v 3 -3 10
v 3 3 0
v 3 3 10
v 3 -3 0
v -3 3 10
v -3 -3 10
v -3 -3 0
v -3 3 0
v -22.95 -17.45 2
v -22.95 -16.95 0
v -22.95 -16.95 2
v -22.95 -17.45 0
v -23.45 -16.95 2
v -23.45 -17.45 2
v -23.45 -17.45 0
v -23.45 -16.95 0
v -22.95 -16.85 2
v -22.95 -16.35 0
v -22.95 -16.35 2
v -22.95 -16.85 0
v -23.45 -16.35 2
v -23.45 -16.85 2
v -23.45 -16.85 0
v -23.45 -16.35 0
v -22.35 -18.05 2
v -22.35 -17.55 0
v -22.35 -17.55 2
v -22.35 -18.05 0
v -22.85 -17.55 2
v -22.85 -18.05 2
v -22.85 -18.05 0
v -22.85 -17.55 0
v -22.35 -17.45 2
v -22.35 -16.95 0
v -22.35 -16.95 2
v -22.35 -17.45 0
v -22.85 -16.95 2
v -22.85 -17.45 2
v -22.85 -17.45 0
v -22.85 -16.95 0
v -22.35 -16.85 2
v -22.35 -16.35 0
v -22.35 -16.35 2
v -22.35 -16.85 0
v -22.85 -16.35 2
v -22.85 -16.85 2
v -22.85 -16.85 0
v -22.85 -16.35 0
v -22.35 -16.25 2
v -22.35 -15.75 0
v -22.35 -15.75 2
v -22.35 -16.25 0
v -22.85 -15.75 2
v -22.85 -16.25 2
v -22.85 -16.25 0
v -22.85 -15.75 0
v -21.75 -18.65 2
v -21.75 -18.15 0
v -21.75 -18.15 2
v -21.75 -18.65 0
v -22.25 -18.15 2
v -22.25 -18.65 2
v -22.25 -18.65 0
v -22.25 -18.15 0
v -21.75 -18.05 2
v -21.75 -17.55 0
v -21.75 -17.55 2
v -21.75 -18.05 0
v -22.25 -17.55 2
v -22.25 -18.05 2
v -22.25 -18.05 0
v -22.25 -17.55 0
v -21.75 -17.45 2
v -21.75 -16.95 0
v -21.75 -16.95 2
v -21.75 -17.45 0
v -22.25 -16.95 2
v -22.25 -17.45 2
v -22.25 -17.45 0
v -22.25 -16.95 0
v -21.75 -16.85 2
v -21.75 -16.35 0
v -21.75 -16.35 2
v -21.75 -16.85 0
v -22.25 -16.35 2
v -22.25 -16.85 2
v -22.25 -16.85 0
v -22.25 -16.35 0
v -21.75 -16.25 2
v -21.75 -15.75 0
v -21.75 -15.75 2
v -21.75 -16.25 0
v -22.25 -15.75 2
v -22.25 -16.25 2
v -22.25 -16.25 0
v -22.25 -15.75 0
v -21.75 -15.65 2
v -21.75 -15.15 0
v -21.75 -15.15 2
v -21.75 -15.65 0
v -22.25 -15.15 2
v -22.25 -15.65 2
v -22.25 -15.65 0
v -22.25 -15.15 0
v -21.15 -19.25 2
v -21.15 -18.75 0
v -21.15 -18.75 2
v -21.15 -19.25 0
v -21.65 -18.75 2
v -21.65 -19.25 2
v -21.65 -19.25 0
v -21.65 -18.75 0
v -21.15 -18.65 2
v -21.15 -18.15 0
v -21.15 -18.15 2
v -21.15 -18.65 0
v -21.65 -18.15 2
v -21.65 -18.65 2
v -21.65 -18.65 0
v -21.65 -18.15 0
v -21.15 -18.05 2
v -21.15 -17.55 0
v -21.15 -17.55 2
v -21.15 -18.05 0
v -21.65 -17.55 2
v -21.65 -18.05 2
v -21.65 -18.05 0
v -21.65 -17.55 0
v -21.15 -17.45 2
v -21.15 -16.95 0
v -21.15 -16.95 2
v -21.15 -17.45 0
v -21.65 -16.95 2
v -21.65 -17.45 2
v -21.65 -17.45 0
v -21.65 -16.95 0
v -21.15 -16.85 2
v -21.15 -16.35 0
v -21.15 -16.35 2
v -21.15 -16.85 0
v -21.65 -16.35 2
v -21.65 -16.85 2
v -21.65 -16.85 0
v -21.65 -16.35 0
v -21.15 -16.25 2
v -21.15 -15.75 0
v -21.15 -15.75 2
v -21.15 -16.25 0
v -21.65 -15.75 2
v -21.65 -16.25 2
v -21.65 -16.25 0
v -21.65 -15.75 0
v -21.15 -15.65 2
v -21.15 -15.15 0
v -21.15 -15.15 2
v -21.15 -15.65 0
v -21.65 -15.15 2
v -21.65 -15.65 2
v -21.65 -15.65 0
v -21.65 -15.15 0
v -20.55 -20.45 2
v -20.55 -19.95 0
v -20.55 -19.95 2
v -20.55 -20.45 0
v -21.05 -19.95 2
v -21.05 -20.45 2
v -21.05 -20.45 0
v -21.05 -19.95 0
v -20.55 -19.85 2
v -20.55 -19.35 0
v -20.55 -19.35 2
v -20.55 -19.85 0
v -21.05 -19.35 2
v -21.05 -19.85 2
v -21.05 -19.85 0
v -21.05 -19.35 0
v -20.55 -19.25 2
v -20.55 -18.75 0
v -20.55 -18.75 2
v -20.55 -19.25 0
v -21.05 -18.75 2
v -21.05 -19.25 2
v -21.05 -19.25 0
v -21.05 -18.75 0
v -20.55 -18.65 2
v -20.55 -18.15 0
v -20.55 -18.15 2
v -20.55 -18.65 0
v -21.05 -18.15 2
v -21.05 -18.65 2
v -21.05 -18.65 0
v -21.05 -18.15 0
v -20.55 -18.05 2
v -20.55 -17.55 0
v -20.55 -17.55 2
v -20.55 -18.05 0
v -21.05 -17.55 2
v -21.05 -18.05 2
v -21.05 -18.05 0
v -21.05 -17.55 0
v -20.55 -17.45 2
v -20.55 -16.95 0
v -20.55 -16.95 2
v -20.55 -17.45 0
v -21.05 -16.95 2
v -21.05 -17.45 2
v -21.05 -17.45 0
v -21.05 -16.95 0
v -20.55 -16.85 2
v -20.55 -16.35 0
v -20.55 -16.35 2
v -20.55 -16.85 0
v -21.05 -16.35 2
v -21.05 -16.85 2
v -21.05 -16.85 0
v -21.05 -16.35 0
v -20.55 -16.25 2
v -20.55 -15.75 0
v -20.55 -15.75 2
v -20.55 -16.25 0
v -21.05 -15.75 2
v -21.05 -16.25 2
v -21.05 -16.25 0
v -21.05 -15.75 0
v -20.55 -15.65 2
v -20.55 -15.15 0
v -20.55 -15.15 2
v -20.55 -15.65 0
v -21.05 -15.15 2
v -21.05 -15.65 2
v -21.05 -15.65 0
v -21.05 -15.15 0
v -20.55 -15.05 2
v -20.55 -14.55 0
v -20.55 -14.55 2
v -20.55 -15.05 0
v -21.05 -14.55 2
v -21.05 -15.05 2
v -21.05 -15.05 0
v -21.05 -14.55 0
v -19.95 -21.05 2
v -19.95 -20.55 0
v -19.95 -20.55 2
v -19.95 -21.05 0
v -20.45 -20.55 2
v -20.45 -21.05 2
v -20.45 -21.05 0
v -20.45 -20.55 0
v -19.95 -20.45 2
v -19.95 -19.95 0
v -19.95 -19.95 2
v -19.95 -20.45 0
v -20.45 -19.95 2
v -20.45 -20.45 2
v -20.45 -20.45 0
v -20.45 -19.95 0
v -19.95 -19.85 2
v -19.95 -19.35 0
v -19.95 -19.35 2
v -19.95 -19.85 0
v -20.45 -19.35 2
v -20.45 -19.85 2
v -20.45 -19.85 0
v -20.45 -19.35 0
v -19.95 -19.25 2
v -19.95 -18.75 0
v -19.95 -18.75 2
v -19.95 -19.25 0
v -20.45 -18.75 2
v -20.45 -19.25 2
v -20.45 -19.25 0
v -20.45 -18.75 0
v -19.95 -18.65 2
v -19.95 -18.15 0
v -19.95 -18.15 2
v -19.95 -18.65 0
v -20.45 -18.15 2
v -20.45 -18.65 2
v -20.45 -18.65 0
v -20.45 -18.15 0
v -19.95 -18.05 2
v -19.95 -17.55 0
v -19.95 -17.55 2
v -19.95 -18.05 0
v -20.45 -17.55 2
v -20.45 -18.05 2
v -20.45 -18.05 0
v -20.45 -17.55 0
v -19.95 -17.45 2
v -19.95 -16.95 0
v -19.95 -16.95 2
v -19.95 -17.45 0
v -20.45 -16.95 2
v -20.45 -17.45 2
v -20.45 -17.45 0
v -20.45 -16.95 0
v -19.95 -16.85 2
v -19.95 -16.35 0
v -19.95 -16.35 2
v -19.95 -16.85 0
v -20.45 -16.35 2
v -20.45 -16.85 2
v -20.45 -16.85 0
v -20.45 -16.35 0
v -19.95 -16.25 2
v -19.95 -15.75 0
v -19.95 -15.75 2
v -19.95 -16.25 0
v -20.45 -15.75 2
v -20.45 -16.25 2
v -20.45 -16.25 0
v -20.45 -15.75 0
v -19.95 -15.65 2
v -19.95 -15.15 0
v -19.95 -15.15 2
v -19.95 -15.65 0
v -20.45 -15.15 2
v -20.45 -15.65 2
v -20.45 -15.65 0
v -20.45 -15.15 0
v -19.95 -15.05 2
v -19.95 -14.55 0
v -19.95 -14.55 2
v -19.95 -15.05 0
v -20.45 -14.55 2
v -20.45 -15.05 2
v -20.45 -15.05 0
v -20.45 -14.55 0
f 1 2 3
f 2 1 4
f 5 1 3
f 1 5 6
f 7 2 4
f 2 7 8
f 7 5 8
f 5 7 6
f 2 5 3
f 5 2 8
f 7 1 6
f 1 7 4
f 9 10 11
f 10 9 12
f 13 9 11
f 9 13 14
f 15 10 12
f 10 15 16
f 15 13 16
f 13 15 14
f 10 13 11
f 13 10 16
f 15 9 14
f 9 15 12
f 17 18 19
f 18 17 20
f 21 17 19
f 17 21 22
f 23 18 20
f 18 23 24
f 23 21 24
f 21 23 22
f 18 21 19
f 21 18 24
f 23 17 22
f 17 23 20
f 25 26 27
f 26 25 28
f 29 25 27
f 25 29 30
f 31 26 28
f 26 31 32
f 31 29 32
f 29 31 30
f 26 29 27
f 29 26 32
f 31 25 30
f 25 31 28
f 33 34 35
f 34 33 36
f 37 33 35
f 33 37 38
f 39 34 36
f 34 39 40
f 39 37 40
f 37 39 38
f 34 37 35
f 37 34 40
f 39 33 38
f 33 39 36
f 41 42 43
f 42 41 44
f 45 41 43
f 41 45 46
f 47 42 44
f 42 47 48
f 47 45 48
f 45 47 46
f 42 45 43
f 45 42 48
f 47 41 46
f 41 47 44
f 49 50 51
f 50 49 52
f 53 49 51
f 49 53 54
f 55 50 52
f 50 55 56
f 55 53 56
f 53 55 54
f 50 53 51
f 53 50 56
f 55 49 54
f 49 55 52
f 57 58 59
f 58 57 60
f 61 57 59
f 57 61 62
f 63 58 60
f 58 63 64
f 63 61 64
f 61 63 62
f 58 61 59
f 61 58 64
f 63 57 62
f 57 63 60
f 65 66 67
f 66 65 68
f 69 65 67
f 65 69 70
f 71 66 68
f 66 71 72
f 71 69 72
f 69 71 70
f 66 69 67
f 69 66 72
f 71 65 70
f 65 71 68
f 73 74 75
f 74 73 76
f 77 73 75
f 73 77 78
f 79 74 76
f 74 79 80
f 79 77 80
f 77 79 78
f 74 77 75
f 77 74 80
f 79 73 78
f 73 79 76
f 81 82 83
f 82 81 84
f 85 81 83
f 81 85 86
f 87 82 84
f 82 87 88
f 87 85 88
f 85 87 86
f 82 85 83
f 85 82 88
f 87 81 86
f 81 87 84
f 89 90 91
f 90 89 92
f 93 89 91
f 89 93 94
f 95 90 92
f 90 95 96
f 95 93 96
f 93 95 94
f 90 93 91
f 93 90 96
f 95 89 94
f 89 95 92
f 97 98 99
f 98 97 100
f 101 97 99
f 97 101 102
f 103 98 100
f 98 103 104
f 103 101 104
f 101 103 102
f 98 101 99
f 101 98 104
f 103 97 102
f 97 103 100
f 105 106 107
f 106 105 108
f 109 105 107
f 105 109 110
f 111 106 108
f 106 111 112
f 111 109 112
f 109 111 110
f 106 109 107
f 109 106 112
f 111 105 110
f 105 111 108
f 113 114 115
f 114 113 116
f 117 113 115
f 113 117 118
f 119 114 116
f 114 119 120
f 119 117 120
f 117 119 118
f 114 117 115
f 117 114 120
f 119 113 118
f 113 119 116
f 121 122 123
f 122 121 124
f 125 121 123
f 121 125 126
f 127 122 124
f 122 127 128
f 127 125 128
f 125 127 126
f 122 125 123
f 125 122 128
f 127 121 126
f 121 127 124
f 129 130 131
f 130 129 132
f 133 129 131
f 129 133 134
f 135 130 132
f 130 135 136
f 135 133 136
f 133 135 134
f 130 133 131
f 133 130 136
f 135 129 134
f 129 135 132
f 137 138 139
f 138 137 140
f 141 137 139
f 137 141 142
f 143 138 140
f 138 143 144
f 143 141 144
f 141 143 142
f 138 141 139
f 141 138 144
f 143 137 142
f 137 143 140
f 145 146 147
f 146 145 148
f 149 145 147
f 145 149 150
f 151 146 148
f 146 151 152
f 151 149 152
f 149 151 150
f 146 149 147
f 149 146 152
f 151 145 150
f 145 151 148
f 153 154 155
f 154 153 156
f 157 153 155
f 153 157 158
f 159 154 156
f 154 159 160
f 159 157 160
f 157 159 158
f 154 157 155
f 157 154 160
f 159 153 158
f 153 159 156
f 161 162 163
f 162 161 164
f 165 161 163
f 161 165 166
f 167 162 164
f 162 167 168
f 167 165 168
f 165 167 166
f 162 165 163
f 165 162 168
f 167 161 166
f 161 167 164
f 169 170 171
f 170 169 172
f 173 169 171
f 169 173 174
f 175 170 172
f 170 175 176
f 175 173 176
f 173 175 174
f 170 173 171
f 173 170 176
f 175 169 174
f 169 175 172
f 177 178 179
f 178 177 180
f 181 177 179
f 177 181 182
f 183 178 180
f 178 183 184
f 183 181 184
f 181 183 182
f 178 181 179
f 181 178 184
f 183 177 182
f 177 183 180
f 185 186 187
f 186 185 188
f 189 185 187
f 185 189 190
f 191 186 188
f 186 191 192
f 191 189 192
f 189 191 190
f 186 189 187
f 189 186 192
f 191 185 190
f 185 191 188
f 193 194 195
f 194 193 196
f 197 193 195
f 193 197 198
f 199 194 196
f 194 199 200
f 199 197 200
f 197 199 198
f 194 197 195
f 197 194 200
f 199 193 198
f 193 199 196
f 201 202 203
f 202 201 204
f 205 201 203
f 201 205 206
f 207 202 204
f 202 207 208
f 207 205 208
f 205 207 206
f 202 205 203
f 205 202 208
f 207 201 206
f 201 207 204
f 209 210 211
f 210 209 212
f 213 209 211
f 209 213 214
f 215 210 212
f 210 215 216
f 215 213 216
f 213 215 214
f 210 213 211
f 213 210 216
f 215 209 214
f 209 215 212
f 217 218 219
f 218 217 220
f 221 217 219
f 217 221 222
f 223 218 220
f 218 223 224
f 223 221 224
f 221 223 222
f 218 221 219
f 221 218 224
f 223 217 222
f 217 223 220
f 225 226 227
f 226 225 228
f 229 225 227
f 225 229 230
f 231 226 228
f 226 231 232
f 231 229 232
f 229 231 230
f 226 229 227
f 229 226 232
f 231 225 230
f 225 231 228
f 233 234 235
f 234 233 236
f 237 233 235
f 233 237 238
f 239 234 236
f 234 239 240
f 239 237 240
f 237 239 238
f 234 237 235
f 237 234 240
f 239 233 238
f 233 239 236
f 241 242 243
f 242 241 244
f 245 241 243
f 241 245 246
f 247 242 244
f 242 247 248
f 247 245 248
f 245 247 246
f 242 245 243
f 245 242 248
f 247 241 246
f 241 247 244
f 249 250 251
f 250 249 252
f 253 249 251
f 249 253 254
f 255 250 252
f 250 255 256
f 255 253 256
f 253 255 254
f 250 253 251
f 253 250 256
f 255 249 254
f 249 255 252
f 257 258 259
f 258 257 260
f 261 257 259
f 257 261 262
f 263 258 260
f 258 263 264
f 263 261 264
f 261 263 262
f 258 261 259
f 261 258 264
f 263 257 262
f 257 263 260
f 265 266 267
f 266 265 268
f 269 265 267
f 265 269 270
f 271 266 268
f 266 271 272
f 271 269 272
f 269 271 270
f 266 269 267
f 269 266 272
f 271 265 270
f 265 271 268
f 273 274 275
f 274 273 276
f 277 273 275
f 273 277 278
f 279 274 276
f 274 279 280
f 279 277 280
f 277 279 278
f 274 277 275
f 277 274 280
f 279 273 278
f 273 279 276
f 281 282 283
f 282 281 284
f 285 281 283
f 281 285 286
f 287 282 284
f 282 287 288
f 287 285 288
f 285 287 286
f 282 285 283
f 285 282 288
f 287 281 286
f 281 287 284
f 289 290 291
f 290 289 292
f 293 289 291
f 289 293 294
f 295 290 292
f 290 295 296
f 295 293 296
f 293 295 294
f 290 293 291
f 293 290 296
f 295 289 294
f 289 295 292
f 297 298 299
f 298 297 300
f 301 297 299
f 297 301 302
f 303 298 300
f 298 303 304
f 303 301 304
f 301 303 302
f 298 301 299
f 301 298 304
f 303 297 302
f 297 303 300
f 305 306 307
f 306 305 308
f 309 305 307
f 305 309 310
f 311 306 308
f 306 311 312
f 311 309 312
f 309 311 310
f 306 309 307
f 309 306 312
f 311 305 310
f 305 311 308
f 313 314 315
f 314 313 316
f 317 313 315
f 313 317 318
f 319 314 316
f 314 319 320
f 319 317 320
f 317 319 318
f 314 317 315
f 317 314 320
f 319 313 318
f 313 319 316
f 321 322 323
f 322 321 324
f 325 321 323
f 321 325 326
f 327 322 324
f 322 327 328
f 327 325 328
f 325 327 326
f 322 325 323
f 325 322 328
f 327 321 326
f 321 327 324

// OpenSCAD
translate([0, 0, 5]) color([0,1,0,0.9]) cube([6, 6, 10], center=true);
translate([-23.2, -17.2, 1]) color([1,0,0]) cube([0.5, 0.5, 2], center=true);
translate([-23.2, -16.6, 1]) color([1,0,0]) cube([0.5, 0.5, 2], center=true);
translate([-22.6, -17.8, 1]) color([1,0,0]) cube([0.5, 0.5, 2], center=true);
translate([-22.6, -17.2, 1]) color([1,0,0]) cube([0.5, 0.5, 2], center=true);
translate([-22.6, -16.6, 1]) color([1,0,0]) cube([0.5, 0.5, 2], center=true);
translate([-22.6, -16.0, 1]) color([1,0,0]) cube([0.5, 0.5, 2], center=true);
translate([-22.0, -18.4, 1]) color([1,0,0]) cube([0.5, 0.5, 2], center=true);
translate([-22.0, -17.8, 1]) color([1,0,0]) cube([0.5, 0.5, 2], center=true);
translate([-22.0, -17.2, 1]) color([1,0,0]) cube([0.5, 0.5, 2], center=true);
translate([-22.0, -16.6, 1]) color([1,0,0]) cube([0.5, 0.5, 2], center=true);
translate([-22.0, -16.0, 1]) color([1,0,0]) cube([0.5, 0.5, 2], center=true);
translate([-22.0, -15.4, 1]) color([1,0,0]) cube([0.5, 0.5, 2], center=true);
translate([-21.4, -19.0, 1]) color([1,0,0]) cube([0.5, 0.5, 2], center=true);
translate([-21.4, -18.4, 1]) color([1,0,0]) cube([0.5, 0.5, 2], center=true);
translate([-21.4, -17.8, 1]) color([1,0,0]) cube([0.5, 0.5, 2], center=true);
translate([-21.4, -17.2, 1]) color([1,0,0]) cube([0.5, 0.5, 2], center=true);
translate([-21.4, -16.6, 1]) color([1,0,0]) cube([0.5, 0.5, 2], center=true);
translate([-21.4, -16.0, 1]) color([1,0,0]) cube([0.5, 0.5, 2], center=true);
translate([-21.4, -15.4, 1]) color([1,0,0]) cube([0.5, 0.5, 2], center=true);
translate([-20.8, -20.2, 1]) color([1,0,0]) cube([0.5, 0.5, 2], center=true);
translate([-20.8, -19.6, 1]) color([1,0,0]) cube([0.5, 0.5, 2], center=true);
translate([-20.8, -19.0, 1]) color([1,0,0]) cube([0.5, 0.5, 2], center=true);
translate([-20.8, -18.4, 1]) color([1,0,0]) cube([0.5, 0.5, 2], center=true);
translate([-20.8, -17.8, 1]) color([1,0,0]) cube([0.5, 0.5, 2], center=true);
translate([-20.8, -17.2, 1]) color([1,0,0]) cube([0.5, 0.5, 2], center=true);
translate([-20.8, -16.6, 1]) color([1,0,0]) cube([0.5, 0.5, 2], center=true);
translate([-20.8, -16.0, 1]) color([1,0,0]) cube([0.5, 0.5, 2], center=true);
translate([-20.8, -15.4, 1]) color([1,0,0]) cube([0.5, 0.5, 2], center=true);
translate([-20.8, -14.8, 1]) color([1,0,0]) cube([0.5, 0.5, 2], center=true);
translate([-20.2, -20.8, 1]) color([1,0,0]) cube([0.5, 0.5, 2], center=true);
translate([-20.2, -20.2, 1]) color([1,0,0]) cube([0.5, 0.5, 2], center=true);
translate([-20.2, -19.6, 1]) color([1,0,0]) cube([0.5, 0.5, 2], center=true);
translate([-20.2, -19.0, 1]) color([1,0,0]) cube([0.5, 0.5, 2], center=true);
translate([-20.2, -18.4, 1]) color([1,0,0]) cube([0.5, 0.5, 2], center=true);
translate([-20.2, -17.8, 1]) color([1,0,0]) cube([0.5, 0.5, 2], center=true);
translate([-20.2, -17.2, 1]) color([1,0,0]) cube([0.5, 0.5, 2], center=true);
translate([-20.2, -16.6, 1]) color([1,0,0]) cube([0.5, 0.5, 2], center=true);
translate([-20.2, -16.0, 1]) color([1,0,0]) cube([0.5, 0.5, 2], center=true);
translate([-20.2, -15.4, 1]) color([1,0,0]) cube([0.5, 0.5, 2], center=true);
translate([-20.2, -14.8, 1]) color([1,0,0]) cube([0.5, 0.5, 2], center=true);
